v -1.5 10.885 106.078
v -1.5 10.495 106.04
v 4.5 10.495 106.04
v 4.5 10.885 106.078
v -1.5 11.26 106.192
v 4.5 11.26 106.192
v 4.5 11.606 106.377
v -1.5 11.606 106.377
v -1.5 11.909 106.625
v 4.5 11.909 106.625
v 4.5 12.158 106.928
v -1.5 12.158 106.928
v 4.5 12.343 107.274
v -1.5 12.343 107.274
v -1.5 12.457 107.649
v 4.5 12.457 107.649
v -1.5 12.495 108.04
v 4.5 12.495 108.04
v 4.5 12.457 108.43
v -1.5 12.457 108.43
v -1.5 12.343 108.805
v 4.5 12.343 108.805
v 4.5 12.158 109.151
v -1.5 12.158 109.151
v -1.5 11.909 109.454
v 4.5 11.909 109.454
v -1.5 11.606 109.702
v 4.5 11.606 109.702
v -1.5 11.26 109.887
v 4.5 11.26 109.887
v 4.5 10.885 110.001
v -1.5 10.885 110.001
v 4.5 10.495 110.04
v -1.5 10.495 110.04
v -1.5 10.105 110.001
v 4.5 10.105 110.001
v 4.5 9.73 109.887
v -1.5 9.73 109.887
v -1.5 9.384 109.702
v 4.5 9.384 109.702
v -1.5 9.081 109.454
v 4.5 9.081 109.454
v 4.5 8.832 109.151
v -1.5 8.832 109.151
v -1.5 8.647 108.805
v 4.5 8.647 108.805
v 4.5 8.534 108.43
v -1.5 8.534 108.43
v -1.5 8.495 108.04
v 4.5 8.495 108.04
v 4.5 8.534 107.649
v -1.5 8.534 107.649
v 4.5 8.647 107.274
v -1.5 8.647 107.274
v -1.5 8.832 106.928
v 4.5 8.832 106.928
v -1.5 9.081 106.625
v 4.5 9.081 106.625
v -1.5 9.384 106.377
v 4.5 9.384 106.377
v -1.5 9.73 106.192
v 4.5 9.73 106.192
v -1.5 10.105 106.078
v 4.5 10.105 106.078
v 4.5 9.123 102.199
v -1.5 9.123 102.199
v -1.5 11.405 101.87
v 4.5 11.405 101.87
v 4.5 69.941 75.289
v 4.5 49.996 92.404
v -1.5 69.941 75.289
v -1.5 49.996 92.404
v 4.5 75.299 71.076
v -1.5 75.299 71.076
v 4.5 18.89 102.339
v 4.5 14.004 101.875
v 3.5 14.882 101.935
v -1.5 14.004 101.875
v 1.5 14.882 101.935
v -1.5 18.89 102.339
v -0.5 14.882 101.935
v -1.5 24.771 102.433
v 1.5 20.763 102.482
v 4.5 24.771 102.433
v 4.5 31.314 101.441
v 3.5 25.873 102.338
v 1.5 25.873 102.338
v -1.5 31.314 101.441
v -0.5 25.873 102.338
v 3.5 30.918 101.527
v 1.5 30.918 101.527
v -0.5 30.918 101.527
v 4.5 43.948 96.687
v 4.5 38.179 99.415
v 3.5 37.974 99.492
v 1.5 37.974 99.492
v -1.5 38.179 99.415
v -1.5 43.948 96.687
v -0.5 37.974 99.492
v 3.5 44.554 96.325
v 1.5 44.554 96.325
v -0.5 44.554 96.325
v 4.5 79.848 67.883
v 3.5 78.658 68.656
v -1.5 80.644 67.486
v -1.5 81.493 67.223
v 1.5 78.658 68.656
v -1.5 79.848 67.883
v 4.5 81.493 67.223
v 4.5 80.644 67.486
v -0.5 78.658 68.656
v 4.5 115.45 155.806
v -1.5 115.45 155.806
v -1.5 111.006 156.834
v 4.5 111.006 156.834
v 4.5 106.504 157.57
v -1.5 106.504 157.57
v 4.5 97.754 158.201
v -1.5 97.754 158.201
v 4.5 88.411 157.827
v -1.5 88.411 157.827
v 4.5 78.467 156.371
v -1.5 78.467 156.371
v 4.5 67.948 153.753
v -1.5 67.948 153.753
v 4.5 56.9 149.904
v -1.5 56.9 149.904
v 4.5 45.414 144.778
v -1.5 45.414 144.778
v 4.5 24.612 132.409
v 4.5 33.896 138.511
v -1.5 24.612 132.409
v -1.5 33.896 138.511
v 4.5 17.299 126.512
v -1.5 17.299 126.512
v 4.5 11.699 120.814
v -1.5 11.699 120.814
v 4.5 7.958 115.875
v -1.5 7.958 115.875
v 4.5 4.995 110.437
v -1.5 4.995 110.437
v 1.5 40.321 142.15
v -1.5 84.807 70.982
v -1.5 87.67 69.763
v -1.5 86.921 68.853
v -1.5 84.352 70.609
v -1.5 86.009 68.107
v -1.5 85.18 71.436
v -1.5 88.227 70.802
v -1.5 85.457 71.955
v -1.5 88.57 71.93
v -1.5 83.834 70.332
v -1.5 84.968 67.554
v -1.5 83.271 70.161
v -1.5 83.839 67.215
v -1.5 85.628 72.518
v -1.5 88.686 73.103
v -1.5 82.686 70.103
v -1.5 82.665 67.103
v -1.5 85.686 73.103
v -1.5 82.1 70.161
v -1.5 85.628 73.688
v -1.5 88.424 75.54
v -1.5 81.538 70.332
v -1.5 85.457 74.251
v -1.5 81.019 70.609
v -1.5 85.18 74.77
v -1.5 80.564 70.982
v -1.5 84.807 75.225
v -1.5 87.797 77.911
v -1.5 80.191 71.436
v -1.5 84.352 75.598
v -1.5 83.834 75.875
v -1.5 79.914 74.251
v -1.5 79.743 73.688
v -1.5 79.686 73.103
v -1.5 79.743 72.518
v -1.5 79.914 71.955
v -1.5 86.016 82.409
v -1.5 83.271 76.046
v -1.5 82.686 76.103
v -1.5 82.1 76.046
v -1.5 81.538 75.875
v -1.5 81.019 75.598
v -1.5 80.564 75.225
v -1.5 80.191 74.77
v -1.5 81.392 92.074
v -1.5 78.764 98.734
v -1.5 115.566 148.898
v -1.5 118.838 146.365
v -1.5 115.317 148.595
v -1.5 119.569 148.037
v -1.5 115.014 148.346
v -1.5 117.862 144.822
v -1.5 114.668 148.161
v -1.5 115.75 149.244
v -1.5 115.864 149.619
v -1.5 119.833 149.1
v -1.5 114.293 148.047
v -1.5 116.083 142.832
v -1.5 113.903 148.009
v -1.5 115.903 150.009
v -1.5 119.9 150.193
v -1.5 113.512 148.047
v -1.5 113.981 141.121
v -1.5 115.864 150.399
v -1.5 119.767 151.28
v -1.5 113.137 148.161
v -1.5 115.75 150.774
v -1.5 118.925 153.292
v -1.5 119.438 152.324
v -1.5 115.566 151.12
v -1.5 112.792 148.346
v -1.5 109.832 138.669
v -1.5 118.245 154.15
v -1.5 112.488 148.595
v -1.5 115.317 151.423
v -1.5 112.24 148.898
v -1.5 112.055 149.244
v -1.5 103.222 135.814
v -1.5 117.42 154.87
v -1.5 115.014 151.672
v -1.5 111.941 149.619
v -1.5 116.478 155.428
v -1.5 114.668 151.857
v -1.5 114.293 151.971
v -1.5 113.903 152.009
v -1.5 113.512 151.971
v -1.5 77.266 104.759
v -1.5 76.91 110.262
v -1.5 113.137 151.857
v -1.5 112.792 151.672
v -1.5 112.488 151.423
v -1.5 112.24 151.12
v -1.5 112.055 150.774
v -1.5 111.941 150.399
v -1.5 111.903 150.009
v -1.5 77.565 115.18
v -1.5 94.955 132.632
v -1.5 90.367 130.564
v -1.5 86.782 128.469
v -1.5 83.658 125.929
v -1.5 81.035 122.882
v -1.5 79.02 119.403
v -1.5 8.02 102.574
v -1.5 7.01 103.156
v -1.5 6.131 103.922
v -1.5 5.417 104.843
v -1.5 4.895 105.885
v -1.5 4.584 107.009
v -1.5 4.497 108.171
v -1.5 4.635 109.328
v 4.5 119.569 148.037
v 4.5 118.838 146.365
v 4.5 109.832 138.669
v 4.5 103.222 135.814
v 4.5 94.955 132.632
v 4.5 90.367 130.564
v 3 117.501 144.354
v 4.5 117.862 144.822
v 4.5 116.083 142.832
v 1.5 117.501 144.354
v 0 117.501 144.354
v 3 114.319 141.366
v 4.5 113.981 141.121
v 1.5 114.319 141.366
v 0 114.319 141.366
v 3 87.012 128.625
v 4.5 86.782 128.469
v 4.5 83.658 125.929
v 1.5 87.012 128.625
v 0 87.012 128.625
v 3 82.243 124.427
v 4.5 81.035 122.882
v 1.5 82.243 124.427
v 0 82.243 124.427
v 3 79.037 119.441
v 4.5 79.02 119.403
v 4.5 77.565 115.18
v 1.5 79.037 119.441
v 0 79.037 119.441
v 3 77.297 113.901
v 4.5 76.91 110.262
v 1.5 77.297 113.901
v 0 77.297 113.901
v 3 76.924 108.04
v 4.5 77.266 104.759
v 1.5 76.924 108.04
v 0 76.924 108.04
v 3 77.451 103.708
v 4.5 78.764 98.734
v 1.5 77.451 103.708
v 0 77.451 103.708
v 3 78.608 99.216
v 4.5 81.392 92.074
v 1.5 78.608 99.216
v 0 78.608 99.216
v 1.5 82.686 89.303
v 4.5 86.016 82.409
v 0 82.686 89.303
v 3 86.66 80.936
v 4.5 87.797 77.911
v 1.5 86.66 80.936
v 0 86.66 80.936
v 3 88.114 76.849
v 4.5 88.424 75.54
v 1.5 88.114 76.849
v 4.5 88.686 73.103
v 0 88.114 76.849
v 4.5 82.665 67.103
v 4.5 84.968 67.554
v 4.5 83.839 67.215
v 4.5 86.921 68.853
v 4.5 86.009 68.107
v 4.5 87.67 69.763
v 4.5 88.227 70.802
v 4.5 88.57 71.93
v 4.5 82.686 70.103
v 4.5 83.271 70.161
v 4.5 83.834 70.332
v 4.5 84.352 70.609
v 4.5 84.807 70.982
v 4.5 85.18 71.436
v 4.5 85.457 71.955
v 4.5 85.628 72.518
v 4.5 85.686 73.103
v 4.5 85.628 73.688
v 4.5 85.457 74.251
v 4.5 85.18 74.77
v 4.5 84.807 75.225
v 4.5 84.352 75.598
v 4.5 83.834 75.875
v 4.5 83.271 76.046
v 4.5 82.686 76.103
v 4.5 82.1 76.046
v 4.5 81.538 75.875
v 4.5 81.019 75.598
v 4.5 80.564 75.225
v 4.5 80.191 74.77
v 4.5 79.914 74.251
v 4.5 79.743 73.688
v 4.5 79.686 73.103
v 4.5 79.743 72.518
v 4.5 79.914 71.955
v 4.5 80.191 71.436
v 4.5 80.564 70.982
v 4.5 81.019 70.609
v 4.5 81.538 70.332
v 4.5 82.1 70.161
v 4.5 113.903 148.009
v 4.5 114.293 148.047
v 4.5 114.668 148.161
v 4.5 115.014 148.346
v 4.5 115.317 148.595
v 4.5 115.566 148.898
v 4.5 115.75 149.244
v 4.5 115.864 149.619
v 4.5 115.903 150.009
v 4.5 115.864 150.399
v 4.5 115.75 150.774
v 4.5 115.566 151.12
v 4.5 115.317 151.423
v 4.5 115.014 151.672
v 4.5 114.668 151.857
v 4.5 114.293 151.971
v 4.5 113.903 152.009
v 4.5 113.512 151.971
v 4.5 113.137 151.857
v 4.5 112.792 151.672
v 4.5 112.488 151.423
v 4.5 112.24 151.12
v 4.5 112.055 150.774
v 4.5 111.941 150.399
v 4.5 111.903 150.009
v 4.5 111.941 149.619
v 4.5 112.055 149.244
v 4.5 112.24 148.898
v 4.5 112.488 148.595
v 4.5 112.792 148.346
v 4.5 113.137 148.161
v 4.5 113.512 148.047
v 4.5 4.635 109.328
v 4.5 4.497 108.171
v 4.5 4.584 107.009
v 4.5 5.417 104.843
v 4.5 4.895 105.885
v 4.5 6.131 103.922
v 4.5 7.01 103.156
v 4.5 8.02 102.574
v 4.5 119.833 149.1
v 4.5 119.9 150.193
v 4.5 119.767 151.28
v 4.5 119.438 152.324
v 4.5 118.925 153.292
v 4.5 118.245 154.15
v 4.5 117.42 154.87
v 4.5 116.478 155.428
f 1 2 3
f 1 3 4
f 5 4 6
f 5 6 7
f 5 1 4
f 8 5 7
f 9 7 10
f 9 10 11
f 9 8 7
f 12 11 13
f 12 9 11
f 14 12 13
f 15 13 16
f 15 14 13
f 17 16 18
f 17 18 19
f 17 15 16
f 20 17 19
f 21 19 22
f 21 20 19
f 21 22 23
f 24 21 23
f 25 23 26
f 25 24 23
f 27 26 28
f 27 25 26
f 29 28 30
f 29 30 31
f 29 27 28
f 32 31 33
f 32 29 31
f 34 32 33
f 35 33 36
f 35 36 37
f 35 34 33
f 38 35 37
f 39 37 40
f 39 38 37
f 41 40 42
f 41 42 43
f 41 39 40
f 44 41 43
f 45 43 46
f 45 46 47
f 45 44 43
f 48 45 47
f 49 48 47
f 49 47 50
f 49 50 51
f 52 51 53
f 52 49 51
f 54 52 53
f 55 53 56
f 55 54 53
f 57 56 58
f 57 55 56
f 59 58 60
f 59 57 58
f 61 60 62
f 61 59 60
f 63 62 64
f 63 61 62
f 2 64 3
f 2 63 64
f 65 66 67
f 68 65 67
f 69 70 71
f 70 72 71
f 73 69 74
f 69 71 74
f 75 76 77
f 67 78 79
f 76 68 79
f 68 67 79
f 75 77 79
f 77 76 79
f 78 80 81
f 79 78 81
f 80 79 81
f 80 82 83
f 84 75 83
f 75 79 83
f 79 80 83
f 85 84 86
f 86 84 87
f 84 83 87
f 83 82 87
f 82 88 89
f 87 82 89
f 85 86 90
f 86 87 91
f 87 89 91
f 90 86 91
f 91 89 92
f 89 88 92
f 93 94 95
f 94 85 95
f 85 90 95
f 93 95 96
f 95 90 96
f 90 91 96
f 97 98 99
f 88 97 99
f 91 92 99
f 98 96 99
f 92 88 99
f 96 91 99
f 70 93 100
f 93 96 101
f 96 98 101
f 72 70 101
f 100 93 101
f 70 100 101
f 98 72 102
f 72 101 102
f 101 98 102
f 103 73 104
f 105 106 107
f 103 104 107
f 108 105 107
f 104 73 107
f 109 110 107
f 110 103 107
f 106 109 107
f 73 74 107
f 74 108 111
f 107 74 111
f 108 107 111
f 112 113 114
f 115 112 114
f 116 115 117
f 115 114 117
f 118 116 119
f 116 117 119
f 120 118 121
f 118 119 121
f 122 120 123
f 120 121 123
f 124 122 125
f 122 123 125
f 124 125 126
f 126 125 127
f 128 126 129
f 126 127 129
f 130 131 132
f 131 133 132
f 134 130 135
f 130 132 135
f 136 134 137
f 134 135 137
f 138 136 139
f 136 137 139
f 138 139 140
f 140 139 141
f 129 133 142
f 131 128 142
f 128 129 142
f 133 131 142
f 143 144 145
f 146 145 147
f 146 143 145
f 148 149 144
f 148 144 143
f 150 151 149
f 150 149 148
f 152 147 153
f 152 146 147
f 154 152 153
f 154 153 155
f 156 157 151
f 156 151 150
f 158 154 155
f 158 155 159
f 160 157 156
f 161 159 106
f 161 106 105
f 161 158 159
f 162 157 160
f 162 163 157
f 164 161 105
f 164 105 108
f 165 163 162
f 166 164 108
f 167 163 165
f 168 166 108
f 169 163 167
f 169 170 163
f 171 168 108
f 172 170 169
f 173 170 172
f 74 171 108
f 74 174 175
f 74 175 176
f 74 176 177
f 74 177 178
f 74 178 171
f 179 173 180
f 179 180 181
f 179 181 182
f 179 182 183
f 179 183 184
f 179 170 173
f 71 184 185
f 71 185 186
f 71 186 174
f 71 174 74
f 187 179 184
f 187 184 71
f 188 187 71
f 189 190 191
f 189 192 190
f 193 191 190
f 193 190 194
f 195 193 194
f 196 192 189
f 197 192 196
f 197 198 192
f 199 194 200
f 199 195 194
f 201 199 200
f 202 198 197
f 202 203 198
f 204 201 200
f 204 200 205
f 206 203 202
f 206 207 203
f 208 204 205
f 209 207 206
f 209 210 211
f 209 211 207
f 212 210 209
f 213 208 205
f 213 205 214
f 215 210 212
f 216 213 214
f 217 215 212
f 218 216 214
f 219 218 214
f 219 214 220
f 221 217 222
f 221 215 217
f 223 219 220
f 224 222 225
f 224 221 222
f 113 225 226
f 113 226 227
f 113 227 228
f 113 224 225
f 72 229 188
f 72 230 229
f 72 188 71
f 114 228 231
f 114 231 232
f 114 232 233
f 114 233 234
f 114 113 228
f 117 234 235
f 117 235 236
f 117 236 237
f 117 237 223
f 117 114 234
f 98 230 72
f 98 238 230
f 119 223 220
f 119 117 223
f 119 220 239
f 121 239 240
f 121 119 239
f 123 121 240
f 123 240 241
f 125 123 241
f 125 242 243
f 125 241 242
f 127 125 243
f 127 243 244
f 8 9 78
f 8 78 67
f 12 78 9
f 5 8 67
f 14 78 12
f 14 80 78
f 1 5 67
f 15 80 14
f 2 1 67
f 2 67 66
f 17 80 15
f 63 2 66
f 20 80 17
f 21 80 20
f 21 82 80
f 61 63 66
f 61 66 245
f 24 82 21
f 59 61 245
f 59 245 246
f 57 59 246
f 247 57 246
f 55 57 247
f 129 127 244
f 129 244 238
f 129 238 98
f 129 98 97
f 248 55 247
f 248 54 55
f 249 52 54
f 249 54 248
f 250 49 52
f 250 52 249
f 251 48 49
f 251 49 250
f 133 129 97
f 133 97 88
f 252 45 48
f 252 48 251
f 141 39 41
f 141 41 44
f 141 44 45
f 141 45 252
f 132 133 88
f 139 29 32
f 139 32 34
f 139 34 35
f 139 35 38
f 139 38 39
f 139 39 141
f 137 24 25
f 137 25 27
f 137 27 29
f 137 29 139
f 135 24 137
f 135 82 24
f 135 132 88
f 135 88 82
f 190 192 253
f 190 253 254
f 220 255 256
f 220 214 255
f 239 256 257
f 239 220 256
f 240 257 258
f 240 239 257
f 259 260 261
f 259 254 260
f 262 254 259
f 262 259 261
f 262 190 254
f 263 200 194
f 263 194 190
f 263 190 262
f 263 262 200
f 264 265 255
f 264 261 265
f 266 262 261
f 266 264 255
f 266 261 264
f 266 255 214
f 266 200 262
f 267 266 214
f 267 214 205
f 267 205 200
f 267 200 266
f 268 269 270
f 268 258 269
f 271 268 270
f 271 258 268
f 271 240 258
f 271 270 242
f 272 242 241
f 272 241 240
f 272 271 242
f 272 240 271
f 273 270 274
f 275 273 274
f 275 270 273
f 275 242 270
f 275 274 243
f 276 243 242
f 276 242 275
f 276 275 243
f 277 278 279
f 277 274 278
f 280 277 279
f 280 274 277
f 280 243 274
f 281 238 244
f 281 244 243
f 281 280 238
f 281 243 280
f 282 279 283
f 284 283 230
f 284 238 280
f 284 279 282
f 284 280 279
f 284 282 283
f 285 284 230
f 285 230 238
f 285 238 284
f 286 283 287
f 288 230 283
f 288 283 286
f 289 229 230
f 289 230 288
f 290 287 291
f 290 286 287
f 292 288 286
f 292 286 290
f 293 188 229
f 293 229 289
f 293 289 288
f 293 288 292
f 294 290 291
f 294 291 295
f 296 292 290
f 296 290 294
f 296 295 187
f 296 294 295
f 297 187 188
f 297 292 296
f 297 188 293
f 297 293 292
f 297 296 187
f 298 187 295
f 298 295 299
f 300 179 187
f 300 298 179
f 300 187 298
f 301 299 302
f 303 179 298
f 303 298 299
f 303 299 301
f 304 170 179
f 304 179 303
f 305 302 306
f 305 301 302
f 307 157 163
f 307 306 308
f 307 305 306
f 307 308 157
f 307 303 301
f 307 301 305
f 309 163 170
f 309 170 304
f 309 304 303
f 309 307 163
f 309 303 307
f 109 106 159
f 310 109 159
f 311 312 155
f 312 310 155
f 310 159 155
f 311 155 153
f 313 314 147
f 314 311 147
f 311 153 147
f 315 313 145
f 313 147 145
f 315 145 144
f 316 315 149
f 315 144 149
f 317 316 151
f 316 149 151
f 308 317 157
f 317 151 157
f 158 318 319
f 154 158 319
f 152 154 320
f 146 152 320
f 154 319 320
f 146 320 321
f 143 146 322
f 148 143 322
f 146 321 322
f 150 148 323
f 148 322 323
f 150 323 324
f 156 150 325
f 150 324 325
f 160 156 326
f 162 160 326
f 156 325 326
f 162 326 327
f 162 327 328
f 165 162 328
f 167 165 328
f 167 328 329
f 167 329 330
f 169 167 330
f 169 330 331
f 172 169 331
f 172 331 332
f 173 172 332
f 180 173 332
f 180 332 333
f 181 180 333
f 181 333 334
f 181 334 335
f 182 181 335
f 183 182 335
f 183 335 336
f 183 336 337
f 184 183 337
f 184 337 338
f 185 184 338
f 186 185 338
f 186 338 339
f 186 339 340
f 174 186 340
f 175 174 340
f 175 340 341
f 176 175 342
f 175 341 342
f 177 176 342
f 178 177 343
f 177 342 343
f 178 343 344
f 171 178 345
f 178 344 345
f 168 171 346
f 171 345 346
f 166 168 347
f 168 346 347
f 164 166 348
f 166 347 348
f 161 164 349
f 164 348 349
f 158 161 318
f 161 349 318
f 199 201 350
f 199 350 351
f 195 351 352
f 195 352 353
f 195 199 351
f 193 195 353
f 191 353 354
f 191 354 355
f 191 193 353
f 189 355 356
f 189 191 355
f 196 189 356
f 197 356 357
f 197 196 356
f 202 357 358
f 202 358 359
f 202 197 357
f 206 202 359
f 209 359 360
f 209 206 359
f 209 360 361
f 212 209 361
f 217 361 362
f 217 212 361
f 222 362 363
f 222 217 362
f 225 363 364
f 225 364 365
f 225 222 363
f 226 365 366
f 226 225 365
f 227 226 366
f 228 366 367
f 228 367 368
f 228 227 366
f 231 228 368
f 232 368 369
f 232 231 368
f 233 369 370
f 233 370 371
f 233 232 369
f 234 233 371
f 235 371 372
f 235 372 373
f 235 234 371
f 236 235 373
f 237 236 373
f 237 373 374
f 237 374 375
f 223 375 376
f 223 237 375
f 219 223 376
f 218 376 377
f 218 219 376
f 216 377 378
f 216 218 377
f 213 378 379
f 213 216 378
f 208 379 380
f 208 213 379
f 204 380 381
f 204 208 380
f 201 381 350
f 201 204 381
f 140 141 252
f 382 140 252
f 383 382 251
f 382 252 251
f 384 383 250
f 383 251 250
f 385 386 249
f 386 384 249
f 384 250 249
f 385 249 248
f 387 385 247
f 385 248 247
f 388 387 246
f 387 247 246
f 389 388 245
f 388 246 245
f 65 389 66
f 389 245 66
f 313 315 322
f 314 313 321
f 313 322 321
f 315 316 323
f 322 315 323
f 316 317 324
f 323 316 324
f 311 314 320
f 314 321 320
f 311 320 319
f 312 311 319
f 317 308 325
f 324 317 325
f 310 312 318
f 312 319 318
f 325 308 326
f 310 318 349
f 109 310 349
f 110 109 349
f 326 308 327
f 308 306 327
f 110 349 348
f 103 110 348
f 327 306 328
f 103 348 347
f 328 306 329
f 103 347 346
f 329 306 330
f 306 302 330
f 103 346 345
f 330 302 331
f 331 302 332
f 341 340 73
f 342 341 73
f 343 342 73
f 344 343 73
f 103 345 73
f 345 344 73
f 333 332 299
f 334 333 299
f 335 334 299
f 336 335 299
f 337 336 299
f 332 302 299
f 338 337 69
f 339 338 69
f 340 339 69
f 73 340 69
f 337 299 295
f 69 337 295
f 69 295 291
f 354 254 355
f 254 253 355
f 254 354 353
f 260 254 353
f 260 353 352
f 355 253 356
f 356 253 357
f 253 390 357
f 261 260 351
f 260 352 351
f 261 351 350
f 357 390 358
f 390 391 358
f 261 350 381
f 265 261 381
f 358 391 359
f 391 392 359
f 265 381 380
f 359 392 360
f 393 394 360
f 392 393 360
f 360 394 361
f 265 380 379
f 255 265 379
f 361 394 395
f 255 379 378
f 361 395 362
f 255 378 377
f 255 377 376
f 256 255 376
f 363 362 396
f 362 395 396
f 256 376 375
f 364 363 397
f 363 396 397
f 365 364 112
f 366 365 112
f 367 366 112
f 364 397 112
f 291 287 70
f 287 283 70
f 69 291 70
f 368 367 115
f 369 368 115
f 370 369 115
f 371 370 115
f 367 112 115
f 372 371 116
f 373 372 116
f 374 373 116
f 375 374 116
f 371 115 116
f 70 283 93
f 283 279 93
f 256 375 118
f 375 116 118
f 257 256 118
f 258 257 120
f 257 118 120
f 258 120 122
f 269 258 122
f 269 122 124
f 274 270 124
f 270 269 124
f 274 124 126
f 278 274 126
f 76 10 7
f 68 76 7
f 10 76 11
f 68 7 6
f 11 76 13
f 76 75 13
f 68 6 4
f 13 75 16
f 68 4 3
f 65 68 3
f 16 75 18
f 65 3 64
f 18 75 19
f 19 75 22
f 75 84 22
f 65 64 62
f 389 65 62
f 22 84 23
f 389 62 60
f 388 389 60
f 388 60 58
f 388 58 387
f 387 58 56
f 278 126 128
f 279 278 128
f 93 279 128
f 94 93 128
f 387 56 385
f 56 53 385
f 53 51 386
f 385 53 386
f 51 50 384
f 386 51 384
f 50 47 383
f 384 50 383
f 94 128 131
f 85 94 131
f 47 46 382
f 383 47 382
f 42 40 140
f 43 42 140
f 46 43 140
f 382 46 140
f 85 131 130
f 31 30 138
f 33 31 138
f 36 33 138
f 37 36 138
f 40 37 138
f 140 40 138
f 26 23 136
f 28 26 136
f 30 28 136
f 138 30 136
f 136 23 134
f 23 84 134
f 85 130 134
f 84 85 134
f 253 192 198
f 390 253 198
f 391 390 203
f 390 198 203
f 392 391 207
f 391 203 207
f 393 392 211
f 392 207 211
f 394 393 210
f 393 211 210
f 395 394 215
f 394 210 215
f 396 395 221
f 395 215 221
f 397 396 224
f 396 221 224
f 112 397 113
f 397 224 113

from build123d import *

# Parameters (mm, degrees)
SKETCH3_R               = 1
SKETCH3_R_2             = 1.375
BOSS_EXTRUDE4_DEPTH     = 3
SCALE1_SCALE            = 2
SKETCH4_R               = 3
CUT_EXTRUDE1_DEPTH      = 217.492464221
CUT_EXTRUDE2_DEPTH      = 217.492464221
CUT_EXTRUDE2_DEPTH_BACK = 217.492464221
SKETCH5_OUTSIDE_W       = 182.432
SKETCH5_OUTSIDE_H       = 155.93


with BuildPart() as part:
    # Sketch3 → Boss-Extrude4 (new body)
    with BuildSketch(Plane.YZ):
        with BuildLine():
            ThreePointArc((68.741192765, 86.464667173), (54.029322851, 96.141629316), (37.312023136, 101.674675757))
            ThreePointArc((37.312023136, 101.674675757), (29.391760942, 109.480441545), (33.583388697, 119.780479872))
            ThreePointArc((33.583388697, 119.780479872), (60.17601512, 133.969459732), (89.135388402, 142.32706876))
            ThreePointArc((89.135388402, 142.32706876), (99.144821049, 138.126502646), (99.427319768, 127.275065319))
            ThreePointArc((99.427319768, 127.275065319), (90.789860229, 110.128583952), (85.032843595, 91.812899689))
            ThreePointArc((85.032843595, 91.812899689), (78.400596073, 84.528160677), (68.741192765, 86.464667173))
        make_face()
        with Locations(Location((39.186227842, 111.497473562, 0), (0, 0, 270))):
            Circle(SKETCH3_R, mode=Mode.SUBTRACT)
        with Locations(Location((90.890008855, 132.482206797, 0), (0, 0, 270))):
            Circle(SKETCH3_R, mode=Mode.SUBTRACT)
        with Locations(Location((75.281557454, 94.029297351, 0), (0, 0, 270))):
            Circle(SKETCH3_R_2, mode=Mode.SUBTRACT)
    extrude(amount=BOSS_EXTRUDE4_DEPTH)


with BuildPart() as part_1:
    # Scale1: scaled about (1.5, 67.877354977, 114.955402134)
    add(part.part.scale(SCALE1_SCALE).moved(Location((-1.5, -67.877354977, -114.955402134))))

    # Sketch4 → Cut-Extrude1 (cut, through all)
    with BuildSketch(Plane.YZ.offset(4.5)):
        with Locations(Location((82.685759932, 73.103192567, 0), (0, 0, 270))):
            Circle(SKETCH4_R)
    extrude(amount=-CUT_EXTRUDE1_DEPTH, mode=Mode.SUBTRACT)

    # Sketch5 outside → Cut-Extrude2 (cut, two sides: drawn at the far end of the back side and taken through both)
    with BuildSketch(Plane.YZ.offset(4.5).offset(-CUT_EXTRUDE2_DEPTH_BACK)):
        with Locations((62.199, 111.556)):
            Rectangle(SKETCH5_OUTSIDE_W, SKETCH5_OUTSIDE_H)
        with BuildLine():
            ThreePointArc((119.569371521, 148.037105906), (119.203645824, 152.8196303), (115.450254013, 155.805990089))
            add(Edge.make_bspline(
                [(115.450254013, 155.805990089), (92.291332554, 161.988615073), (50.144999616, 152.195780174), (10.640315527, 123.38981482), (4.994818673, 110.43681376)],
                knots=[0.017811673, 0.017811673, 0.017811673, 0.017811673, 0.625020949, 0.983264819, 0.983264819, 0.983264819, 0.983264819], degree=3))
            ThreePointArc((4.994818673, 110.43681376), (5.130906228, 105.351531301), (9.123047592, 102.19852879))
            add(Edge.make_bspline(
                [(9.123047592, 102.19852879), (12.874033904, 101.317423127), (20.330488059, 103.128054064), (32.415267004, 101.651722539), (43.037738842, 97.936984862), (58.438217116, 85.786415304), (69.386713525, 74.853454362), (80.449954201, 67.434576825), (81.492677056, 67.22300947)],
                knots=[0, 0, 0, 0, 0.139372949, 0.261466364, 0.436165055, 0.534003981, 0.961982331, 1, 1, 1, 1], degree=3))
            ThreePointArc((81.492677056, 67.22300947), (86.483226373, 68.457845581), (88.685759932, 73.103192567))
            add(Edge.make_bspline(
                [(119.569371521, 148.037105906), (115.777884331, 137.141424956), (83.707026682, 134.20773874), (74.375699666, 110.415829432), (80.752950982, 92.088648695), (88.685759932, 77.778956378), (88.685759932, 73.103192567)],
                knots=[0.022808472, 0.022808472, 0.022808472, 0.022808472, 0.37815179, 0.637109171, 0.823995801, 0.964332075, 0.964332075, 0.964332075, 0.964332075], degree=3))
        make_face(mode=Mode.SUBTRACT)
    extrude(amount=CUT_EXTRUDE2_DEPTH + CUT_EXTRUDE2_DEPTH_BACK, mode=Mode.SUBTRACT)


solid = part_1.part
